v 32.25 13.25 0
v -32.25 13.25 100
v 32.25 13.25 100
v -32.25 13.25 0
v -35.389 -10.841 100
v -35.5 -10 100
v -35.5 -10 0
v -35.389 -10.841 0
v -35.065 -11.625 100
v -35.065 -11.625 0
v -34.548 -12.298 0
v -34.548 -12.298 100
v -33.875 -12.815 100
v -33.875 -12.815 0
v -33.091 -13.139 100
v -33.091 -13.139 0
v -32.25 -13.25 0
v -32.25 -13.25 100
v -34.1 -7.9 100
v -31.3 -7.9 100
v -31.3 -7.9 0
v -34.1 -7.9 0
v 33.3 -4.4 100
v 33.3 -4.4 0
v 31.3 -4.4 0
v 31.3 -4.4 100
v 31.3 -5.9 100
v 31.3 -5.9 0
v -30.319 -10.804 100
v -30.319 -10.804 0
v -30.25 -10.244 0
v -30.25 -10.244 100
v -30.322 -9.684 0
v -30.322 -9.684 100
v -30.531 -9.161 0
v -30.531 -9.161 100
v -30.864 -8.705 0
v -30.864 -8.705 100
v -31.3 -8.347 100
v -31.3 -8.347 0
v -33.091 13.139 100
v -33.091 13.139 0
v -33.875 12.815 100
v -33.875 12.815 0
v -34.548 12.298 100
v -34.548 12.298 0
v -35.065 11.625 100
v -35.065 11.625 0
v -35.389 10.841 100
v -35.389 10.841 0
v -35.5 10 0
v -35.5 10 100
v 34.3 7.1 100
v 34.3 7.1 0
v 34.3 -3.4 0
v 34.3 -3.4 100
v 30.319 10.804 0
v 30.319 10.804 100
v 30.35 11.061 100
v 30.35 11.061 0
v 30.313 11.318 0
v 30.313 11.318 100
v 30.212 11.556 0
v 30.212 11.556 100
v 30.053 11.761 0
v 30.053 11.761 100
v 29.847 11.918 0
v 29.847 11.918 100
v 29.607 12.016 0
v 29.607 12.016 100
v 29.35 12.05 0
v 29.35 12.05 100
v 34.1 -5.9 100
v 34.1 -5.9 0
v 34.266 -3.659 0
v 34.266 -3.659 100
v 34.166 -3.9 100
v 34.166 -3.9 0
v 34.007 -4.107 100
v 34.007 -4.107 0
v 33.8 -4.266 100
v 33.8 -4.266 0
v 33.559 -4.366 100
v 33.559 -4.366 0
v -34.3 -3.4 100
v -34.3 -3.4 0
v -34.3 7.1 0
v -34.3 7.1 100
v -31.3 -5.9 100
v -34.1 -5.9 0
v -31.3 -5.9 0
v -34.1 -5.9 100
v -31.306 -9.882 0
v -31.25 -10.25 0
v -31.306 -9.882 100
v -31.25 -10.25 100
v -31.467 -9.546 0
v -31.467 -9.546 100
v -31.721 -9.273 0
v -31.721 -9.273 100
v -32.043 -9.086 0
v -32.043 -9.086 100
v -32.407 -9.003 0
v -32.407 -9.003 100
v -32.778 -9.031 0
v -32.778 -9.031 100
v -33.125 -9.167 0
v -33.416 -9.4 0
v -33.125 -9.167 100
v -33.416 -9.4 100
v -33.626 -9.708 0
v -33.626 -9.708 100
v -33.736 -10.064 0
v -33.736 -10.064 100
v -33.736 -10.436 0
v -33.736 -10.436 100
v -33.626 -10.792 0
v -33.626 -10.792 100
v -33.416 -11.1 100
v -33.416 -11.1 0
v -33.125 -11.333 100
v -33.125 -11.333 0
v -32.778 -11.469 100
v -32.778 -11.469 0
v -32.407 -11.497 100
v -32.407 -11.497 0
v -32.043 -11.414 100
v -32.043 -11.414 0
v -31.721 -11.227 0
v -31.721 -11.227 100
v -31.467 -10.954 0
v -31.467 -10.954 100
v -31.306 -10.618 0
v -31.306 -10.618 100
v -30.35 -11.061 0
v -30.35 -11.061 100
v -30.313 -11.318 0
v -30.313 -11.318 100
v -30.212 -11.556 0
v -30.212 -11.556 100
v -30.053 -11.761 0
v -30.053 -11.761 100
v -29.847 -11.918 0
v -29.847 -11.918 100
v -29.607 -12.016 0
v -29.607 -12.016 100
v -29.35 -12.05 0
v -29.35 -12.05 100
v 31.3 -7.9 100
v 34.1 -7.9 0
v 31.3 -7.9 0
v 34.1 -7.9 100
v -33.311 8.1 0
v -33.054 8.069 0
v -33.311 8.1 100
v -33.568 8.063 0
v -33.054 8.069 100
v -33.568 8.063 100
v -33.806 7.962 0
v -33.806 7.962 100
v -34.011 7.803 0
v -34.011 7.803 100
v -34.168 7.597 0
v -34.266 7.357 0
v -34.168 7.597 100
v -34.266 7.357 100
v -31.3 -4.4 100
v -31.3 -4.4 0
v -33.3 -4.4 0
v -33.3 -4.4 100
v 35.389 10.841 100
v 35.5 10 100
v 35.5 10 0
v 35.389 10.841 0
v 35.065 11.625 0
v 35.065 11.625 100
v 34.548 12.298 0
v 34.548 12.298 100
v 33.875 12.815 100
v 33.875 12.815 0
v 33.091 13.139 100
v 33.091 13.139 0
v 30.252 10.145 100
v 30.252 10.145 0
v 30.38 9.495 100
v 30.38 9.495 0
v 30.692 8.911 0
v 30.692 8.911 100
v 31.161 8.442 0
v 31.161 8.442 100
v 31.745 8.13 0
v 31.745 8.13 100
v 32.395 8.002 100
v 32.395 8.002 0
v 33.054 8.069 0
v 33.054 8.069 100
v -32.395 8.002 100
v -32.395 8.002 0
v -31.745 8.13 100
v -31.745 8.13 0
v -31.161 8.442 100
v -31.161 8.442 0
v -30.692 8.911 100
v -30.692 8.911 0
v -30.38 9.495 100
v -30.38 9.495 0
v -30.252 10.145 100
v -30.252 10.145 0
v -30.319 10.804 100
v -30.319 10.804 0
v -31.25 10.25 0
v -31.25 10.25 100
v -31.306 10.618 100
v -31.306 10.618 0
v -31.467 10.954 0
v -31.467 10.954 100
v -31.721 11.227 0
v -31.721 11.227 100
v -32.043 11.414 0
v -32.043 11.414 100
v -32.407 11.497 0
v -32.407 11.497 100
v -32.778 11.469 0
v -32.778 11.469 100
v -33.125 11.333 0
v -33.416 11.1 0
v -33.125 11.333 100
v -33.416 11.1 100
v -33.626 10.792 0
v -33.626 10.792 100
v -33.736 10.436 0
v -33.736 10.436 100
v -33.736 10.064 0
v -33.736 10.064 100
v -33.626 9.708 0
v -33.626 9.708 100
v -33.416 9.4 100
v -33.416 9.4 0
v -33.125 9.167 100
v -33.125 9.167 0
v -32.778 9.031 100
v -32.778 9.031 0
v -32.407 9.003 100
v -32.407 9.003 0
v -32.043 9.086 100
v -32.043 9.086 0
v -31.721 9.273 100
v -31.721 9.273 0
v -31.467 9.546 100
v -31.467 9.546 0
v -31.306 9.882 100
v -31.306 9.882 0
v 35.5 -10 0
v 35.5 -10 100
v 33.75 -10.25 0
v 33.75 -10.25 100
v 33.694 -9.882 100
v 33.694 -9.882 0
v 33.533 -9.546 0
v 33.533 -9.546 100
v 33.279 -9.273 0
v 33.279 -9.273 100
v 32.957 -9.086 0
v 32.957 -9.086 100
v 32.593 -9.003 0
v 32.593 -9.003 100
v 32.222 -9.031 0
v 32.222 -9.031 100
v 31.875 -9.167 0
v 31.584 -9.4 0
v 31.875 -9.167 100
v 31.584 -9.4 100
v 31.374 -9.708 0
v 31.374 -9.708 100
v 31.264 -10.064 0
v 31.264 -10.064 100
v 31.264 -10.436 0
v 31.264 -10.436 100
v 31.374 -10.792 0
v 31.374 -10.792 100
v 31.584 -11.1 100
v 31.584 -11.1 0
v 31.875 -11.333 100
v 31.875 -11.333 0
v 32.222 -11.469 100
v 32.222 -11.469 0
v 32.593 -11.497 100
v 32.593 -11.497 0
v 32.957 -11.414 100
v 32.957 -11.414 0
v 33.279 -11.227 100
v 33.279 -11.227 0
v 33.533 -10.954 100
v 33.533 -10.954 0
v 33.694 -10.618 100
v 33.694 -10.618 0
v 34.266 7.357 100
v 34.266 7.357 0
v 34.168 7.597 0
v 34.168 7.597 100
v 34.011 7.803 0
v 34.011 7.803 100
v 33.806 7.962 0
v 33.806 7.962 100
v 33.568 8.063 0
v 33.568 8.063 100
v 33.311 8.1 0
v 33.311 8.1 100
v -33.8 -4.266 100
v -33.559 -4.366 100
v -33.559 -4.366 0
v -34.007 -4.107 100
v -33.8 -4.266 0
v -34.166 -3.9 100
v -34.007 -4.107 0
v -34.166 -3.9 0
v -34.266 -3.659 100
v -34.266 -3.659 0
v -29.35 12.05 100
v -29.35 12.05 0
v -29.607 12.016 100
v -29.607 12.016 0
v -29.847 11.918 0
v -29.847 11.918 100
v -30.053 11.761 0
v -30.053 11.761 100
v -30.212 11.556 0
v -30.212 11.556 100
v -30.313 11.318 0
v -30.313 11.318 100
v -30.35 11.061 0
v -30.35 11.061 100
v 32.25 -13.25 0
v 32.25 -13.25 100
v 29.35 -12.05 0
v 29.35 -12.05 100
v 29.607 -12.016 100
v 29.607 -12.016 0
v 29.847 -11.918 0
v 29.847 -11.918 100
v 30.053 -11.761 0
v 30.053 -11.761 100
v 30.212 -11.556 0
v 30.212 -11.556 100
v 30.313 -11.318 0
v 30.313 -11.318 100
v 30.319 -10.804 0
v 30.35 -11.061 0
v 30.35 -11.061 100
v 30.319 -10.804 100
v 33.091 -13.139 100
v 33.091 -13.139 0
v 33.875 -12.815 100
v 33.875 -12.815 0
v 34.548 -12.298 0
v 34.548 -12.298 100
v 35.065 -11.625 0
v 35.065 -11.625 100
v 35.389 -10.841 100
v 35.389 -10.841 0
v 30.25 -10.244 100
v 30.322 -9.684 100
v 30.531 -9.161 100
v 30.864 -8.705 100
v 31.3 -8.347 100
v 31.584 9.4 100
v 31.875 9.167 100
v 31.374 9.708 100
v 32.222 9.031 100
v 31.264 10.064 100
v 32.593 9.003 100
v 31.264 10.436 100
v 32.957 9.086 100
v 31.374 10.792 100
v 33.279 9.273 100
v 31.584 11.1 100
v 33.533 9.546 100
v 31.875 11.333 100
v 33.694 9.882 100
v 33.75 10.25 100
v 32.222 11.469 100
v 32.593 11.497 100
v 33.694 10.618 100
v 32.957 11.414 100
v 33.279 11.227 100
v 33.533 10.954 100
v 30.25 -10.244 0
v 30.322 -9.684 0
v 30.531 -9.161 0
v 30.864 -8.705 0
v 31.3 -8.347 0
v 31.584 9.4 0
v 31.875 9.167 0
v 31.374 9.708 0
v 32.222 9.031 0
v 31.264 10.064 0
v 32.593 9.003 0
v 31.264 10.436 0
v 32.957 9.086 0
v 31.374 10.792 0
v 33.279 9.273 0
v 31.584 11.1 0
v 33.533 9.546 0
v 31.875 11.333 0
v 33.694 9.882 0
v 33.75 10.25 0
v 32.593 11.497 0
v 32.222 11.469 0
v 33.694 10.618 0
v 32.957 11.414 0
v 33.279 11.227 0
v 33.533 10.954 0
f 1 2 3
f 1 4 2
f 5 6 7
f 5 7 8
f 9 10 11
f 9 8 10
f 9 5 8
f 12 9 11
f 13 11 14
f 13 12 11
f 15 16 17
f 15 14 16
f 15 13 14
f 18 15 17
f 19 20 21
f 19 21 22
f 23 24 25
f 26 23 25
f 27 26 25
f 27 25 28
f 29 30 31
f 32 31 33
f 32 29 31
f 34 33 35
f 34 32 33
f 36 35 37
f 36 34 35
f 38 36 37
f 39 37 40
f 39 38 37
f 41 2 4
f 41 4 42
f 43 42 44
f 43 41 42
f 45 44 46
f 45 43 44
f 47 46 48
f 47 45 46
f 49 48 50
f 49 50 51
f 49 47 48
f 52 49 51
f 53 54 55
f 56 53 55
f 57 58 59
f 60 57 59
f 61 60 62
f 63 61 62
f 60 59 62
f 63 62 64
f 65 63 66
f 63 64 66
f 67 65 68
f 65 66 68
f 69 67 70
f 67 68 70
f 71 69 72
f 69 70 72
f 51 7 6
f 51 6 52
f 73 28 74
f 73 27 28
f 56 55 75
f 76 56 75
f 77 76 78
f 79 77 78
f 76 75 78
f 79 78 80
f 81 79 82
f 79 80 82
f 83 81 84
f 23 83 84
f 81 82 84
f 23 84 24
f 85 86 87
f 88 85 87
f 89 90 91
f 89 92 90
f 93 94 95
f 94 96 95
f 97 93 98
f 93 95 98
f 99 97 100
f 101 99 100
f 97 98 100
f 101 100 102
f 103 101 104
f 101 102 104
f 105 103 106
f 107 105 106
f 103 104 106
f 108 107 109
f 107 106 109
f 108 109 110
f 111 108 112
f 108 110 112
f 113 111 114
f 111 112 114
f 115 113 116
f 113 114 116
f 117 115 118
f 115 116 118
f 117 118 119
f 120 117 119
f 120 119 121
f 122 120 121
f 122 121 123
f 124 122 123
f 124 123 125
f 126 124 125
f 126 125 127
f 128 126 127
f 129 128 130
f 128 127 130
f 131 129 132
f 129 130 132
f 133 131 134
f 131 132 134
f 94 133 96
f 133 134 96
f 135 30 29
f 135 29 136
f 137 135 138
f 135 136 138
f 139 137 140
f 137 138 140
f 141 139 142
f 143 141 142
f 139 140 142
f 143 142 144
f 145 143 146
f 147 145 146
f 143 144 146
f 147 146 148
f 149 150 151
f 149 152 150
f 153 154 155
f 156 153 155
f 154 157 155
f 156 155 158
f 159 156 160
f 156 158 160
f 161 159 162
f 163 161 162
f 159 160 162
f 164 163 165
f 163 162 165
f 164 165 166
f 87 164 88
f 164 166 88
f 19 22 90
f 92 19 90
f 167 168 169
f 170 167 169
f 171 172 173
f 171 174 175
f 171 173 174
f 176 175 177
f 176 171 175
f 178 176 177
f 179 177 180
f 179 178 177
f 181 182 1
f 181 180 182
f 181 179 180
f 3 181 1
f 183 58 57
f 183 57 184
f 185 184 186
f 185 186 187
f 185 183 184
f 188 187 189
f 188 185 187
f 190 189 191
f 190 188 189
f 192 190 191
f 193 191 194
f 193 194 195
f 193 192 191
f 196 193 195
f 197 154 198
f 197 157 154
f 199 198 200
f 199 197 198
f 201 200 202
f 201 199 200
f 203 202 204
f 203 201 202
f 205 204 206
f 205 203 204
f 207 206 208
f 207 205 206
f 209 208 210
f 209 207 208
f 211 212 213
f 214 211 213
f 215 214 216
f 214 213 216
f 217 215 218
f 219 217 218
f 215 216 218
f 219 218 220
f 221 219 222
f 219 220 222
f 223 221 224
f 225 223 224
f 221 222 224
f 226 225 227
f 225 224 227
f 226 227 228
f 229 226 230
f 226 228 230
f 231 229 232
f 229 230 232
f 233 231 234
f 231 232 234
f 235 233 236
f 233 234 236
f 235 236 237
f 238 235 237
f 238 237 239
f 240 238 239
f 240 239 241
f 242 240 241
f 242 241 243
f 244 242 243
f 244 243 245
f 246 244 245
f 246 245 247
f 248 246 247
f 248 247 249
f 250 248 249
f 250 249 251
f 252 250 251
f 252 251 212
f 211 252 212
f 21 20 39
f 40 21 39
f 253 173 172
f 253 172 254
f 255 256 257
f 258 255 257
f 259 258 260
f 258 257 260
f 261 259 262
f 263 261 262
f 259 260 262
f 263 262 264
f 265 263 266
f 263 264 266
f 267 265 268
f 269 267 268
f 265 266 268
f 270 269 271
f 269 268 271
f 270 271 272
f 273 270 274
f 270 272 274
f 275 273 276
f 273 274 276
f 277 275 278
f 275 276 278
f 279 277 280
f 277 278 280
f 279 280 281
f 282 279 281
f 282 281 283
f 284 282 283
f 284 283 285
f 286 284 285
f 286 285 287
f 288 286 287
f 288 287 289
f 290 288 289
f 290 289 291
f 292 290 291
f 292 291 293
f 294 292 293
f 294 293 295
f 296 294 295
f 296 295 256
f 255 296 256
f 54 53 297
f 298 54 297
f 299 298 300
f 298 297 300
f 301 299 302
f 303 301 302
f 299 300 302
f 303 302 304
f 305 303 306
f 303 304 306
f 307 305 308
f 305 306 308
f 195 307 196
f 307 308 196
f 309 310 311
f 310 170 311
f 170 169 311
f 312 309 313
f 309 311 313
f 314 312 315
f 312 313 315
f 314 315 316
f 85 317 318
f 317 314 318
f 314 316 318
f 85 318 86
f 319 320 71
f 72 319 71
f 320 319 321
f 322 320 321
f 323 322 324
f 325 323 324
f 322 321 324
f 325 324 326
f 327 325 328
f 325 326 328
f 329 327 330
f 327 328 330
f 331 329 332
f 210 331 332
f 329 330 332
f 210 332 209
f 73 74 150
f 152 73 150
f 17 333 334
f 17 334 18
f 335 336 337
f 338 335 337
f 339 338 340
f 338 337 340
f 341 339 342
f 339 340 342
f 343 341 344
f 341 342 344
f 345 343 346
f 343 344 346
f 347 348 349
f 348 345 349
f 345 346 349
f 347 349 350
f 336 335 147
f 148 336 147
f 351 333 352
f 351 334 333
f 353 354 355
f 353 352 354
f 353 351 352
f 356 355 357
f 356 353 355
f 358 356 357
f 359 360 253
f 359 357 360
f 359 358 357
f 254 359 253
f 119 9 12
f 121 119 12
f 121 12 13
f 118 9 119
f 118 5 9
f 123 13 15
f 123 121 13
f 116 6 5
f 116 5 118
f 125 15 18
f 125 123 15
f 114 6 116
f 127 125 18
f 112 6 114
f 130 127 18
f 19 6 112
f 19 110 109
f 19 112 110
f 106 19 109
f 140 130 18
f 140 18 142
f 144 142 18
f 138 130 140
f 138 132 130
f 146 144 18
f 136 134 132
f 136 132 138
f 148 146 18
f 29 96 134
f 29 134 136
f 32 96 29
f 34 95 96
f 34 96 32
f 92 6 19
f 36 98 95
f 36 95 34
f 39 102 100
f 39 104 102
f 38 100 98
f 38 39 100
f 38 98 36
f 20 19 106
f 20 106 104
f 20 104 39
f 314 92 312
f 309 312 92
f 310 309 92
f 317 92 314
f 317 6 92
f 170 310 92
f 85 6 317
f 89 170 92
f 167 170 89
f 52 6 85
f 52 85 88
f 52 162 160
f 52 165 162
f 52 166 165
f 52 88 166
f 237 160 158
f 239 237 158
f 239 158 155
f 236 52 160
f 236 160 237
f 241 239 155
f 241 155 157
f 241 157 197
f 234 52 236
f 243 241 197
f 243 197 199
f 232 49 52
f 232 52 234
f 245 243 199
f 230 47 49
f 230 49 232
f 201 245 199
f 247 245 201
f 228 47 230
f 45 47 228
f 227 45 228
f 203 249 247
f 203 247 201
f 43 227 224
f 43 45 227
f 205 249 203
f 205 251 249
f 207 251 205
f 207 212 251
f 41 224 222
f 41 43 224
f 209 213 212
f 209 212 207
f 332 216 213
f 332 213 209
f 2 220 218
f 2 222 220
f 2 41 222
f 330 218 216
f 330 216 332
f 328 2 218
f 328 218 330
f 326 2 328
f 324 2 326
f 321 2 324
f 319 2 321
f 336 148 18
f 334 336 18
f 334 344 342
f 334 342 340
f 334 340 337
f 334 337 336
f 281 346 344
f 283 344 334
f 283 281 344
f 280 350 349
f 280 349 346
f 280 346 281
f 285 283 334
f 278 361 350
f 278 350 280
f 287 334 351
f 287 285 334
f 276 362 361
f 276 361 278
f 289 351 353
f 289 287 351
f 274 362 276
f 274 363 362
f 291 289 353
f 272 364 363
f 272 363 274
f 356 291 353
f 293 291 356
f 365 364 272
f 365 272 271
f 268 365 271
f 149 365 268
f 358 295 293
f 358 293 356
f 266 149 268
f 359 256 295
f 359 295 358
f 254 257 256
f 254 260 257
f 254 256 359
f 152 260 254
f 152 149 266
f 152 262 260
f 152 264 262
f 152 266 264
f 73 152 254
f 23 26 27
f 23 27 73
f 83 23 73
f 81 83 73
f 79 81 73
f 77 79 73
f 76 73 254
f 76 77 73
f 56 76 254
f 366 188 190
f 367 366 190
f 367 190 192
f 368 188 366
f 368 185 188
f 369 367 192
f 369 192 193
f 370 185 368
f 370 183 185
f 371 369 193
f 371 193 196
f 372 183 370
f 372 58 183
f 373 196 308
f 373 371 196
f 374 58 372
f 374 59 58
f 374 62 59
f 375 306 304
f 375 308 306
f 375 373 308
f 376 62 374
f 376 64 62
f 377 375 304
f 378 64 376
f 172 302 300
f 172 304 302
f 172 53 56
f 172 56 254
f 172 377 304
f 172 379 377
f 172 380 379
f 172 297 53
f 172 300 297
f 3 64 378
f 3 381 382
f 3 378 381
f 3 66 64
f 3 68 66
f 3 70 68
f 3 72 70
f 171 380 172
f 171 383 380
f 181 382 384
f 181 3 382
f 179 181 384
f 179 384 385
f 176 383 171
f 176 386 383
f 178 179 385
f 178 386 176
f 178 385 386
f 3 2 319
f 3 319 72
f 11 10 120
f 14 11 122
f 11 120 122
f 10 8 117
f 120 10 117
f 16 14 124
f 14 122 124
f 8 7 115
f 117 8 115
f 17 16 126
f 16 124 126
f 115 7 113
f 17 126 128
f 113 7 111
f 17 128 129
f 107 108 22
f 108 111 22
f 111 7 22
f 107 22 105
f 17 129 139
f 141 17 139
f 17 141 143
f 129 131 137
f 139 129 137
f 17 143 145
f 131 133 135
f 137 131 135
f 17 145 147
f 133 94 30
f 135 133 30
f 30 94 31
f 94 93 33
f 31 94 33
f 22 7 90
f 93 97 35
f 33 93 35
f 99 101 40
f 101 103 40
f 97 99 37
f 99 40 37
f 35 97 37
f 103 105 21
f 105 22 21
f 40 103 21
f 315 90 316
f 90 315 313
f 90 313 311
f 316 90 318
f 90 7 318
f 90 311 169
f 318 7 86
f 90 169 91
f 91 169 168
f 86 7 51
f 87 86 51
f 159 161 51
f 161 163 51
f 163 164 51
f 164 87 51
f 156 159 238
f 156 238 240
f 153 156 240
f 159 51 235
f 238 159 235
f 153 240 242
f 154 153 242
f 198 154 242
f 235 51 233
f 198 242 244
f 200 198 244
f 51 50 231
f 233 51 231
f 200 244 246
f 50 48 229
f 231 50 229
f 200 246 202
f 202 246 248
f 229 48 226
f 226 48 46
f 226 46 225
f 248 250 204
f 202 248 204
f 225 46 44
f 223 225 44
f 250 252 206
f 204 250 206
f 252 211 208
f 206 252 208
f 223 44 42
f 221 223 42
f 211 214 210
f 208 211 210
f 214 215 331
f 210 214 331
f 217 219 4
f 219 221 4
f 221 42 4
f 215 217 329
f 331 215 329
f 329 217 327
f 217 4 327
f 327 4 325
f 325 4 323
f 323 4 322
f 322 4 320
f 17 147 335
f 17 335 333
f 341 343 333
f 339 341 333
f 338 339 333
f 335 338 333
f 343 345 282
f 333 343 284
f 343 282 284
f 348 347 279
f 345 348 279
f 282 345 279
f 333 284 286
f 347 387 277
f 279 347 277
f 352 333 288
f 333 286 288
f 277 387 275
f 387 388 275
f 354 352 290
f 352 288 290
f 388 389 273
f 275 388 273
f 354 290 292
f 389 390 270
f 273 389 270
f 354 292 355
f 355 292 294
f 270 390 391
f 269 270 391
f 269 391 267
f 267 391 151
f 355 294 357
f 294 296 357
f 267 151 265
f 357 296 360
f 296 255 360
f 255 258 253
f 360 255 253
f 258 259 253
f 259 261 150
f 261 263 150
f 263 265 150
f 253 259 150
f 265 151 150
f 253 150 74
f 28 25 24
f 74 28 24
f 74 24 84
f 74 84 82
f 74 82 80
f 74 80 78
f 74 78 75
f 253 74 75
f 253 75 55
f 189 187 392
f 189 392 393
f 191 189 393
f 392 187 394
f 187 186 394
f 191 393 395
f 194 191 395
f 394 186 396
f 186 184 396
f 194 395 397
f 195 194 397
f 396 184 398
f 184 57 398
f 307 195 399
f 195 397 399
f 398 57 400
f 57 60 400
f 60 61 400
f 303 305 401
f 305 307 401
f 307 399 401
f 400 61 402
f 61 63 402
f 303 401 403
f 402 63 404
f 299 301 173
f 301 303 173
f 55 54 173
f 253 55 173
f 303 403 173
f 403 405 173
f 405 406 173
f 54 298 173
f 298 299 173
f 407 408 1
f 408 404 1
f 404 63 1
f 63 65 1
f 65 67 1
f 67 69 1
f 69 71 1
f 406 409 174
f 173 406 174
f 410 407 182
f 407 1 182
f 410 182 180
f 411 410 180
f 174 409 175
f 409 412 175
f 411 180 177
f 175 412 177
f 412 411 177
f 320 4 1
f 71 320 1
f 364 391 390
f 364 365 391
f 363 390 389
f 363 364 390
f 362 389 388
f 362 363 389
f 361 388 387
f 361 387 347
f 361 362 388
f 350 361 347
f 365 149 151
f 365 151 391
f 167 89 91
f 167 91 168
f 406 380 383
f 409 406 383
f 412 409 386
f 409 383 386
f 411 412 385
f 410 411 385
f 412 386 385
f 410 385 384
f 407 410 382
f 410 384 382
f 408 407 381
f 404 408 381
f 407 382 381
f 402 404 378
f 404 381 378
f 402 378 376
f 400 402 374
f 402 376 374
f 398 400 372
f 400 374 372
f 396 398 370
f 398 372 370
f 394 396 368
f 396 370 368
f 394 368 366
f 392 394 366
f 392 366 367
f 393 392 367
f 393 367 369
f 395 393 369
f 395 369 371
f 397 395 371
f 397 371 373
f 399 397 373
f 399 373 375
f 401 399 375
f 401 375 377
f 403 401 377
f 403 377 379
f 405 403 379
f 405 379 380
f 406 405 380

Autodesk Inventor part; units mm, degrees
ref_plane "YZ Plane" through (0, 0, 0) normal (1, 0, 0) x (0, 1, 0)
ref_plane "XZ Plane" through (0, 0, 0) normal (0, 1, 0) x (-1, 0, 0)
ref_plane "XY Plane" through (0, 0, 0) normal (0, 0, 1) x (1, 0, 0)
sketch "Sketch1" plane through (0, 0, 0) normal (0, 0, 1) x (1, 0, 0)
  line L0 (-35.5, 13.25) -> (35.5, 13.25)
  line L1 (35.5, 13.25) -> (35.5, -13.25)
  line L2 (35.5, -13.25) -> (-35.5, -13.25)
  line L3 (-35.5, -13.25) -> (-35.5, 13.25)
  line L4 (-34.3, 12.05) -> (34.3, 12.05)
  line L5 (34.3, 12.05) -> (34.3, -12.05)
  line L6 (34.3, -12.05) -> (-34.3, -12.05)
  line L7 (-34.3, -12.05) -> (-34.3, 12.05)
  point P0 (0, 0)
  dimension "d0" = 71
  dimension "d1" = 26.5
  dimension "d2" = 35.5
  dimension "d3" = 13.25
  dimension "d4" = 1.2
  dimension "d5" = 1.2
  dimension "d6" = 1.2
  dimension "d7" = 1.2
extrude "Extrusion1" add sketch "Sketch1" along normal blind 100
fillet "Fillet1" radius 2 4 edges at (-34.3, 12.05, 50) (34.3, 12.05, 50) (34.3, -12.05, 50) (-34.3, -12.05, 50)
fillet "Fillet2" radius 3.25 4 edges at (-35.5, 13.25, 50) (-35.5, -13.25, 50) (35.5, -13.25, 50) (35.5, 13.25, 50)
sketch "Sketch2" plane through (0, 0, 100) normal (0, 0, 1) x (1, 0, 0)
  line L0 (-34.3, -10.05) -> (-34.3, 10.05) projected
  line L1 (-34.3, -7.9) -> (-31.3, -7.9)
  line L2 (-31.3, -7.9) -> (-31.3, -9.4)
  line L3 (-31.3, -9.4) -> (-34.3, -9.4)
  line L4 (-34.3, -9.4) -> (-34.3, -7.9)
  line L5 (34.3, 10.05) -> (34.3, -10.05) projected
  line L6 (34.3, -7.9) -> (31.3, -7.9)
  line L7 (31.3, -7.9) -> (31.3, -9.4)
  line L8 (31.3, -9.4) -> (34.3, -9.4)
  line L9 (34.3, -9.4) -> (34.3, -7.9)
  line L10 (-32.25, -13.25) -> (32.25, -13.25) projected
  line L11 (-34.3, -5.9) -> (-31.3, -5.9)
  line L12 (-31.3, -5.9) -> (-31.3, -4.4)
  line L13 (-31.3, -4.4) -> (-34.3, -4.4)
  line L14 (-34.3, -4.4) -> (-34.3, -5.9)
  line L15 (31.3, -5.9) -> (34.3, -5.9)
  line L16 (34.3, -5.9) -> (34.3, -4.4)
  line L17 (34.3, -4.4) -> (31.3, -4.4)
  line L18 (31.3, -4.4) -> (31.3, -5.9)
  point P0 (0, 0)
  dimension "d12" = 3.85
  dimension "d13" = 1.5
  dimension "d14" = 3
  dimension "d15" = 3
  dimension "d16" = 1.5
  dimension "d17" = 2
extrude "Extrusion2" add sketch "Sketch2" against normal blind 100
fillet "Fillet3" radius 1 4 edges at (-34.3, -4.4, 50) (-34.3, -9.4, 50) (34.3, -9.4, 50) (34.3, -4.4, 50)
sketch "Sketch3" plane through (0, 0, 100) normal (0, 0, 1) x (1, 0, 0)
  line L0 (32.25, 13.25) -> (-32.25, 13.25) projected
  line L1 (-35.5, 10) -> (-35.5, -10) projected
  line L2 (-32.25, -13.25) -> (32.25, -13.25) projected
  line L3 (35.5, -10) -> (35.5, 10) projected
  circle A0 centre (-32.5, 10.25) radius 2.25
  circle A1 centre (-32.5, -10.25) radius 2.25
  circle A2 centre (32.5, -10.25) radius 2.25
  circle A3 centre (32.5, 10.25) radius 2.25
  point P0 (0, 0)
  dimension "d21" = 3
  dimension "d22" = 3
  dimension "d23" = 3
  dimension "d24" = 3
  dimension "d25" = 3
  dimension "d26" = 3
  dimension "d27" = 3
  dimension "d28" = 3
  dimension "d29" = 4.5
  dimension "d30" = 4.5
  dimension "d31" = 4.5
  dimension "d32" = 4.5
extrude "Extrusion3" add sketch "Sketch3" against normal blind 100
sketch "Sketch4" plane through (0, 0, 100) normal (0, 0, 1) x (1, 0, 0)
  arc A0 (-34.3, 8.9) -> (-31.15, 12.05) centre (-32.5, 10.25) ccw projected
  arc A1 (31.15, 12.05) -> (34.3, 8.9) centre (32.5, 10.25) ccw projected
  arc A2 (31.3, -8.3467) -> (31.15, -12.05) centre (32.5, -10.25) ccw projected
  arc A3 (-31.15, -12.05) -> (-31.3, -8.3467) centre (-32.5, -10.25) ccw projected
  circle A4 centre (-32.5, 10.25) radius 1.25
  circle A5 centre (-32.5, -10.25) radius 1.25
  circle A6 centre (32.5, 10.25) radius 1.25
  circle A7 centre (32.5, -10.25) radius 1.25
  point P0 (0, 0)
  dimension "d35" = 2.5
  dimension "d36" = 2.5
  dimension "d37" = 2.5
  dimension "d38" = 2.5
extrude "Extrusion4" cut sketch "Sketch4" against normal blind 100
sketch "Sketch6" plane through (0, 0, 100) normal (0, 0, 1) x (1, 0, 0)
  line L0 (34.3, -5.9) -> (34.3, -7.9) projected
  line L1 (-34.3, -7.9) -> (-34.3, -5.9) projected
  line L2 (-31.3, -7.9) -> (-34.3, -7.9) projected
  line L3 (-31.3, -7.9) -> (-31.5, -7.9)
  line L4 (-31.5, -7.9) -> (-31.5, -9.4)
  line L5 (-31.5, -9.4) -> (-31.3, -9.4)
  line L6 (-31.3, -9.4) -> (-31.3, -7.9)
  line L7 (-31.3, -5.9) -> (-31.3, -4.4) projected
  line L8 (-31.3, -4.4) -> (-31.5, -4.4)
  line L9 (-31.5, -4.4) -> (-31.5, -5.9)
  line L10 (-31.5, -5.9) -> (-31.3, -5.9)
  line L11 (-31.3, -5.9) -> (-31.3, -4.4)
  line L12 (31.3, -4.4) -> (31.5, -4.4)
  line L13 (31.5, -4.4) -> (31.5, -5.9)
  line L14 (31.5, -5.9) -> (31.3, -5.9)
  line L15 (31.3, -5.9) -> (31.3, -4.4)
  line L16 (31.3, -7.9) -> (31.5, -7.9)
  line L17 (31.5, -7.9) -> (31.5, -9.4)
  line L18 (31.5, -9.4) -> (31.3, -9.4)
  line L19 (31.3, -9.4) -> (31.3, -7.9)
  line L20 (-31.3, -5.9) -> (-34.3, -5.9) projected
  line L21 (-34.3, -5.9) -> (-32.5, -5.9)
  line L22 (-32.5, -5.9) -> (-32.5, -7.9)
  line L23 (-32.5, -7.9) -> (-34.3, -7.9)
  line L24 (-34.3, -7.9) -> (-34.3, -5.9)
  line L25 (34.3, -5.9) -> (31.3, -5.9) projected
  line L26 (31.3, -7.9) -> (34.3, -7.9) projected
  line L27 (34.3, -5.9) -> (32.5, -5.9)
  line L28 (32.5, -5.9) -> (32.5, -7.9)
  line L29 (32.5, -7.9) -> (34.3, -7.9)
  line L30 (34.3, -7.9) -> (34.3, -5.9)
  point P0 (0, 0)
  point P1 (32.5, -5.9)
  point P2 (-31.5, -5.9)
  dimension "d46" = 68.6
  dimension "d47" = 65
  dimension "d48" = 1.8
  dimension "d49" = 1.8
  dimension "d50" = 1
  dimension "d51" = 1.5
  dimension "d52" = 1
extrude "Extrusion6" add sketch "Sketch6" against normal blind 100 contours L0 L26 L28 L25 | L1 L20 L22 L2
sketch "Sketch7" plane through (0, 0, 100) normal (0, 0, 1) x (1, 0, 0)
  line L0 (-32.25, -13.25) -> (32.25, -13.25) projected
  line L1 (32.25, 13.25) -> (-32.25, 13.25) projected
  line L2 (35.5, -10) -> (35.5, 10) projected
  line L3 (-35.5, 10) -> (-35.5, -10) projected
  line L4 (-34.1, -5.9) -> (34.1, -5.9)
  line L5 (34.1, -5.9) -> (34.1, -7.9)
  line L6 (34.1, -7.9) -> (-34.1, -7.9)
  line L7 (-34.1, -7.9) -> (-34.1, -5.9)
  line L8 (-32.5, -5.9) -> (-31.3, -5.9) projected
  line L9 (-31.3, -7.9) -> (-32.5, -7.9) projected
  line L10 (-32.5, -7.9) -> (-32.5, -5.9) projected
  line L11 (32.5, -5.9) -> (32.5, -7.9) projected
  point P0 (0, 0)
  point P1 (35.5, 4.9)
  point P2 (-29.5, -6.05)
  point P3 (-29.5, -7.9)
  dimension "d55" = 26.5
  dimension "d56" = 71
  dimension "d57" = 68.2
  dimension "d58" = 1.6
  dimension "d59" = 1.6
extrude "Extrusion7" cut sketch "Sketch7" against normal blind 200
fillet "Fillet4" radius 1 6 edges at (-34.3, 8.9, 50) (-31.15, 12.05, 50) (31.15, 12.05, 50) (34.3, 8.9, 50) (31.15, -12.05, 50) (-31.15, -12.05, 50)
properties part number "case"
